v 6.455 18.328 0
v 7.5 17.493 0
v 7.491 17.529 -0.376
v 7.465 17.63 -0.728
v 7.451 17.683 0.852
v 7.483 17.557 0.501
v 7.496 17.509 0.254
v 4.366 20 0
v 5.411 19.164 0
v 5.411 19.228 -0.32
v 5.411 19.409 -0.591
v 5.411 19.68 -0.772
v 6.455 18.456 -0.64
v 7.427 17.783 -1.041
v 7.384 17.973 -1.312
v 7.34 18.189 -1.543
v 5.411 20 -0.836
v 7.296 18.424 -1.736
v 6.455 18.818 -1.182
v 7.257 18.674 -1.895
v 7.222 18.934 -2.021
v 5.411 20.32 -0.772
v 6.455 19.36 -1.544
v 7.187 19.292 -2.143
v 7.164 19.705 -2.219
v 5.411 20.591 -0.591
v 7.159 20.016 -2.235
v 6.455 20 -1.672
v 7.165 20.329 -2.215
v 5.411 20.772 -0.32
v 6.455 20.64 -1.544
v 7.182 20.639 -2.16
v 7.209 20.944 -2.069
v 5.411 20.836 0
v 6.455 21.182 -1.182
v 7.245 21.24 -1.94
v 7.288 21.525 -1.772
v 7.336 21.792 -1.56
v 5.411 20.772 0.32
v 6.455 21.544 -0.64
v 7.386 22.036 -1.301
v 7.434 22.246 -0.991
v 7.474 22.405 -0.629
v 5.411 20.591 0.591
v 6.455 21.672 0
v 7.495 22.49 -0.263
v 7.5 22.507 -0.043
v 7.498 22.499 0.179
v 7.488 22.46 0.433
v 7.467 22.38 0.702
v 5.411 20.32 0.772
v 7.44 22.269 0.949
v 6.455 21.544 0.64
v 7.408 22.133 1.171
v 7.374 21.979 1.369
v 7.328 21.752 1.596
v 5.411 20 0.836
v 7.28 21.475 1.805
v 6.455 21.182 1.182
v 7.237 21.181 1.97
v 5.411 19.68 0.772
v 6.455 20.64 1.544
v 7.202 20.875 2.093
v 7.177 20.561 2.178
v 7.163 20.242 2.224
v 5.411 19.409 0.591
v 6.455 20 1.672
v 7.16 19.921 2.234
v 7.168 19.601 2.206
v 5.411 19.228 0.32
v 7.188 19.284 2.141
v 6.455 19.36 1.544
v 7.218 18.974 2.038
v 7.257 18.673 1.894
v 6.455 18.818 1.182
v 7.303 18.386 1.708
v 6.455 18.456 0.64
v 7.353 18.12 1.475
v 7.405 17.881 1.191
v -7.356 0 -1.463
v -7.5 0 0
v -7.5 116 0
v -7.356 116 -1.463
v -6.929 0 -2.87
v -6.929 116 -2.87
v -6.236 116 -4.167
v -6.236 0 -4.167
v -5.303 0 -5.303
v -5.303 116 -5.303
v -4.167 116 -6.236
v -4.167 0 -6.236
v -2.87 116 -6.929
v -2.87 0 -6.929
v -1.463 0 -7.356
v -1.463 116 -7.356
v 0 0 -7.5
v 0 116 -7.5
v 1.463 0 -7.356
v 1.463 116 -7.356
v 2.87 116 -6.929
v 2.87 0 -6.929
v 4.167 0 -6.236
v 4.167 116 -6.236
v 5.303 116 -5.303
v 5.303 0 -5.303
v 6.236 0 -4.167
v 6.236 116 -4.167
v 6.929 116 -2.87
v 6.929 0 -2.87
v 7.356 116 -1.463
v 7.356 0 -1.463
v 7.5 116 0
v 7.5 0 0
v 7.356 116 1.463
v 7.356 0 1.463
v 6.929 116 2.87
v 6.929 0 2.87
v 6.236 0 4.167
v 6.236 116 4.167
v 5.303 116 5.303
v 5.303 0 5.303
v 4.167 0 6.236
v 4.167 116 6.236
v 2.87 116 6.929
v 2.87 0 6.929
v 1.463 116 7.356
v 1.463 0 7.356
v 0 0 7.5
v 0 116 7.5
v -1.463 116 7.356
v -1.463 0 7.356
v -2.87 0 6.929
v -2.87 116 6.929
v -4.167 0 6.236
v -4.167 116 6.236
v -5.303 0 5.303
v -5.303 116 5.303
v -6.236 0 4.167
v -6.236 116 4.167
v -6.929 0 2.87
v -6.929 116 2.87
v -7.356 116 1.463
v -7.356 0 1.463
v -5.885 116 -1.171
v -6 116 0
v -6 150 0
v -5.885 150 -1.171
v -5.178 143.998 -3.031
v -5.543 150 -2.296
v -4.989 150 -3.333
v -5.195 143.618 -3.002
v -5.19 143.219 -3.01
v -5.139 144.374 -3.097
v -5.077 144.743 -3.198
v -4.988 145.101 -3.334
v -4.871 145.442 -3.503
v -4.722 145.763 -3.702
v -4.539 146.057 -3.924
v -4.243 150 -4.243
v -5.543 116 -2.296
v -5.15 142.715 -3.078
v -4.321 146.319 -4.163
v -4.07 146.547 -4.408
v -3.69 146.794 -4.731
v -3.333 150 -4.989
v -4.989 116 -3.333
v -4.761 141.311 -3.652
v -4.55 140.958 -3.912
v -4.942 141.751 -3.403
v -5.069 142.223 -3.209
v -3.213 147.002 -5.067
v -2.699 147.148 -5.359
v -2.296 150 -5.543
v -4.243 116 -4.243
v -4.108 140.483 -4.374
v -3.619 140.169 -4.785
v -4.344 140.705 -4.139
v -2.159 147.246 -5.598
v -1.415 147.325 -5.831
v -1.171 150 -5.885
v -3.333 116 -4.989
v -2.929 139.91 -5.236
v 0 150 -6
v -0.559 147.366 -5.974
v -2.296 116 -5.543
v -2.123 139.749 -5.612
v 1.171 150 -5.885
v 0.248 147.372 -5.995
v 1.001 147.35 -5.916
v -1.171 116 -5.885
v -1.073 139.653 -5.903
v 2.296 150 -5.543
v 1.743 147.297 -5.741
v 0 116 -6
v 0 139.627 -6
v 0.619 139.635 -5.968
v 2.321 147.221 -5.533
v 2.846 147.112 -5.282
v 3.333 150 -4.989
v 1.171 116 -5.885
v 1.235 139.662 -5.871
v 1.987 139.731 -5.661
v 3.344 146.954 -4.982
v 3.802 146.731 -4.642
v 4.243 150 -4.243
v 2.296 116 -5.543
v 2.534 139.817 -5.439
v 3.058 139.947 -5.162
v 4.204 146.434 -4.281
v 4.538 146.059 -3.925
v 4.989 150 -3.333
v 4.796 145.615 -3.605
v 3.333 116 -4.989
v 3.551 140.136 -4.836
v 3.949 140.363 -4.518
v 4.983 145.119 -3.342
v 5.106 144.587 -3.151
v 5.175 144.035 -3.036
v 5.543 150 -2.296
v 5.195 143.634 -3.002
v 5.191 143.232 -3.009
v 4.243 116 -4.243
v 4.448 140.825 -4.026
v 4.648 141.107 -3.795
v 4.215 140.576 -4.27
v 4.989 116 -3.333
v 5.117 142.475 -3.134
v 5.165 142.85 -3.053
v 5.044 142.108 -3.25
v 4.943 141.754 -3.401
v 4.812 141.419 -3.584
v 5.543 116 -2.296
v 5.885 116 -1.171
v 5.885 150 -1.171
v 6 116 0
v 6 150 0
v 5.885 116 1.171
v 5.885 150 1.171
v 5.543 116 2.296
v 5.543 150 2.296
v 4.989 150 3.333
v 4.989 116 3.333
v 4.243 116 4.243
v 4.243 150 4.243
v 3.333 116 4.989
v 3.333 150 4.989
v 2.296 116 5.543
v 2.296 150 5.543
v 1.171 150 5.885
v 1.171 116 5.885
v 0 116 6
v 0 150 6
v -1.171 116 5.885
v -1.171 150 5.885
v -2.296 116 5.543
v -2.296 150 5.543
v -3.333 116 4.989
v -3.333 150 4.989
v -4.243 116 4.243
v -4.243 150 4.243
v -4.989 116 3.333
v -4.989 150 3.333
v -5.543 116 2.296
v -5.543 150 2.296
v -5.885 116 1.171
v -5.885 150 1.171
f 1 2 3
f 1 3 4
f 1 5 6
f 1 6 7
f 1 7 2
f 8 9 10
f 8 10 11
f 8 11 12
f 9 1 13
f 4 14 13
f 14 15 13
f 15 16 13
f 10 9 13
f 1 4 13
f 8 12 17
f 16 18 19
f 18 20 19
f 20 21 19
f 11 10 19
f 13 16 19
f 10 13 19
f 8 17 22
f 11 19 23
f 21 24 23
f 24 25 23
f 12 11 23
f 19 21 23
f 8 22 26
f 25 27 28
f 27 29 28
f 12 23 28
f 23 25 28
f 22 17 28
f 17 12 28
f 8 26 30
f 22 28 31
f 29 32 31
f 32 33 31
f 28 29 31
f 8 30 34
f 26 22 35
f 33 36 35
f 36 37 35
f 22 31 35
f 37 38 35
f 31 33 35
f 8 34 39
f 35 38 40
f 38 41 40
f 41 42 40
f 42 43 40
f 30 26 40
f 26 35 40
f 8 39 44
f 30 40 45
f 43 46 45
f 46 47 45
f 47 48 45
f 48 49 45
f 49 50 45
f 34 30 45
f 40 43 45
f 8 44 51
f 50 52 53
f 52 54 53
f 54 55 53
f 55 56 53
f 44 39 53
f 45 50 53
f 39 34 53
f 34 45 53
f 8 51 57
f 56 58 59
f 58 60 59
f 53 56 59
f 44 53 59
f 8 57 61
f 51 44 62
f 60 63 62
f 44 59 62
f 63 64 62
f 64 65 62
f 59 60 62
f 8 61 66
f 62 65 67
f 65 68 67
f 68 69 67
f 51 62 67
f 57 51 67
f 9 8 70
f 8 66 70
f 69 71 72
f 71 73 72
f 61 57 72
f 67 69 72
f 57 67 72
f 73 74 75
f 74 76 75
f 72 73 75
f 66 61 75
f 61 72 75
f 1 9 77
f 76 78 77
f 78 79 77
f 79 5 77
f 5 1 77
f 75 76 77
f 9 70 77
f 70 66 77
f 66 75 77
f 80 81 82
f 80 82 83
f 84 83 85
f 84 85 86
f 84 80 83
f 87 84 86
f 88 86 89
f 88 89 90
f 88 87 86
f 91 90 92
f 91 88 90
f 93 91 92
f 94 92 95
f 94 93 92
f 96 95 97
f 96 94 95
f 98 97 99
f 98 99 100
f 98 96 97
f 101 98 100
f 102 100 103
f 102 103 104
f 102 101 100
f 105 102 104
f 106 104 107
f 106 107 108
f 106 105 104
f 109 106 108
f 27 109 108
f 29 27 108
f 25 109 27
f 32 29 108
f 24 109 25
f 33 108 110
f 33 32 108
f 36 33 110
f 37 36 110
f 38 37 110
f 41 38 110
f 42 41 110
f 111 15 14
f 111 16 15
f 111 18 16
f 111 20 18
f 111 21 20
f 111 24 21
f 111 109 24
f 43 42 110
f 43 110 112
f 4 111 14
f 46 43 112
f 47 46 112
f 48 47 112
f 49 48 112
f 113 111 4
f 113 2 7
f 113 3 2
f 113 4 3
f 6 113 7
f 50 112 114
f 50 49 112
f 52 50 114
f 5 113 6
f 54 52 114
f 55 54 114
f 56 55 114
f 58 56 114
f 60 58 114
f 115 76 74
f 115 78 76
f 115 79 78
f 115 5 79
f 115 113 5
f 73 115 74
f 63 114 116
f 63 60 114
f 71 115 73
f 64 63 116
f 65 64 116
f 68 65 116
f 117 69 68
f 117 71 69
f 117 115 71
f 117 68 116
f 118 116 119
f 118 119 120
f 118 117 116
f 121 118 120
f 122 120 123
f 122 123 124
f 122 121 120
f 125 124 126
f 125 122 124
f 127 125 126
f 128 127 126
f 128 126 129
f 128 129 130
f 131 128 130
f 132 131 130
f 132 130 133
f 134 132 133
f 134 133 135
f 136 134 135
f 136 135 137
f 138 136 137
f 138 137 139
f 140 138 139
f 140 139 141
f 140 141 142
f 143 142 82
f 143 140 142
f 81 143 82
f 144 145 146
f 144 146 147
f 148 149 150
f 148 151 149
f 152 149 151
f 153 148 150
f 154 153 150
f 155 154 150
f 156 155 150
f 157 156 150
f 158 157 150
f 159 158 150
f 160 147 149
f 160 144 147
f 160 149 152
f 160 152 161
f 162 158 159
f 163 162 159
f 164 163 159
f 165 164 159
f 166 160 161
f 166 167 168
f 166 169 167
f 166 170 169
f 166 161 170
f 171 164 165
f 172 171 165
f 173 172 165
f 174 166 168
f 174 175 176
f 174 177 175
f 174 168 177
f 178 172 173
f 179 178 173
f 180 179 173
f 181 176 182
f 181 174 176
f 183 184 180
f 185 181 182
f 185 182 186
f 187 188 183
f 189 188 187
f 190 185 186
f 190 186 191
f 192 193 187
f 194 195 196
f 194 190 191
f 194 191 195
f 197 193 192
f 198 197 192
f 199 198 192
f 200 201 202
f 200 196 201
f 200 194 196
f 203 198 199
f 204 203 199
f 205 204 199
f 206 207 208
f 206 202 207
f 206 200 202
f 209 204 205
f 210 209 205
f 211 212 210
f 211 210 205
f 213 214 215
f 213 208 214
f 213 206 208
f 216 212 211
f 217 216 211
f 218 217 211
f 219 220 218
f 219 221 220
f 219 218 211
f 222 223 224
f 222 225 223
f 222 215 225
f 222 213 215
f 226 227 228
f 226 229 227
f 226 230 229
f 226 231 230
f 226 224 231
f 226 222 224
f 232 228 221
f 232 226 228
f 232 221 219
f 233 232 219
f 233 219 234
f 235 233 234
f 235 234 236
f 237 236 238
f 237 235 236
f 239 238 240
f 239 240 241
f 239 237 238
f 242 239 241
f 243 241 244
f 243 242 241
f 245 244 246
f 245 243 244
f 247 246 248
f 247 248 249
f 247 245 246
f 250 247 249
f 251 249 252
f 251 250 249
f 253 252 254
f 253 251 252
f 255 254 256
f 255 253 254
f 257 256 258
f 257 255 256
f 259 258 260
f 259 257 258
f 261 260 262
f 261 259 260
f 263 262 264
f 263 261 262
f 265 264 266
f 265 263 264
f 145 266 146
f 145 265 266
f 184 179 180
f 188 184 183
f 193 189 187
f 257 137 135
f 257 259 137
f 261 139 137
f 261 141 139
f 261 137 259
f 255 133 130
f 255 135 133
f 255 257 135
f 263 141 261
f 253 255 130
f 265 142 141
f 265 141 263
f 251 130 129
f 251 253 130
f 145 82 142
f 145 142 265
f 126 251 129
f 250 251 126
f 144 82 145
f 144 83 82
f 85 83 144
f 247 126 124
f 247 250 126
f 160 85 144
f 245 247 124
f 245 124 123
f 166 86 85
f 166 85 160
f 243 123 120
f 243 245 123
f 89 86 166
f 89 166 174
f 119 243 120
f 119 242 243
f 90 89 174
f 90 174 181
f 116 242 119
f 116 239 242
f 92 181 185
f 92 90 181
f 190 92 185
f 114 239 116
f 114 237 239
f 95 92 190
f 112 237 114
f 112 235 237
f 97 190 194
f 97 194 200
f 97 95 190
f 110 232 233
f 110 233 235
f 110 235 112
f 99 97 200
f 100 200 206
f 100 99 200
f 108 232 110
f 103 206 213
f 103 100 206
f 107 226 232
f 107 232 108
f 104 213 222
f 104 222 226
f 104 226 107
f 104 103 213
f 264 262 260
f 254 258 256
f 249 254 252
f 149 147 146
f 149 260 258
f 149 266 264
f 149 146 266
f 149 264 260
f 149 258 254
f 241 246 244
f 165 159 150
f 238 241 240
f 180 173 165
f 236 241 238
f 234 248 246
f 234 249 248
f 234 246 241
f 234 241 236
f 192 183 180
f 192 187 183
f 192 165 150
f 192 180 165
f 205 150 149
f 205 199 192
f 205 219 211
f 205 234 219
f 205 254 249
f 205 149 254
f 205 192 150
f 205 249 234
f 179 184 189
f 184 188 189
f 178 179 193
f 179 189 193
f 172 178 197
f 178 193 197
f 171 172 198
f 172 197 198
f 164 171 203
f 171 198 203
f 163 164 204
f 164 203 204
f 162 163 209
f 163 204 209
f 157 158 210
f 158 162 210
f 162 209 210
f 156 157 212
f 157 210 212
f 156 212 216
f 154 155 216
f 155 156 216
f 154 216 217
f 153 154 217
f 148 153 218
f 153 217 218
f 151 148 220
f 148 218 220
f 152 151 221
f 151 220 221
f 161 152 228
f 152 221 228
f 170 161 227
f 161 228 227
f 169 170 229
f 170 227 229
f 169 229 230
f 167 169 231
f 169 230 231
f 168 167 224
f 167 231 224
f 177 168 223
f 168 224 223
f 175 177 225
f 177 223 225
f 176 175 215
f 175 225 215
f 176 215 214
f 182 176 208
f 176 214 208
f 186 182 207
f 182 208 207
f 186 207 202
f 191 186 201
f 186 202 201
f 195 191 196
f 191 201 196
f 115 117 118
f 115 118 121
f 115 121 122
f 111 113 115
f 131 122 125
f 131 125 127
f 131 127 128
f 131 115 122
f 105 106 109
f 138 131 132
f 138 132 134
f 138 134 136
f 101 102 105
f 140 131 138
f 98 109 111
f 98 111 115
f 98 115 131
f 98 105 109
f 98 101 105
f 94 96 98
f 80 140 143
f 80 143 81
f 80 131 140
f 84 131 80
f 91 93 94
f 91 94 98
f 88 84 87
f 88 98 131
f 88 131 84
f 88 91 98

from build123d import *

# Parameters (mm, degrees)
F4_R     = 4
F5_DEPTH = 12.5


with BuildPart() as f1:
    # F0 (on Top) → F1 (revolve)
    with BuildSketch(Plane.XY):
        Polygon((-7.5, 0), (0, 0), (0, 150), (-6, 150), (-6, 116), (-7.5, 116), align=None)
    revolve(axis=Axis((0, 75, 0), (0, -1, 0)))

    # F2 (on Top) → F3 (revolve, cut)
    with BuildSketch(Plane.XY):
        Polygon((4.365895, 20), (9.365895, 16), (9.365895, 20), align=None)
    revolve(axis=Axis((12.081508, 20, 0), (1, 0, 0)), mode=Mode.SUBTRACT)

    # F4 (on Right) → F5 (cut, symmetric)
    with BuildSketch(Plane.YZ):
        with Locations((143.5, -7)):
            Circle(F4_R)
    extrude(amount=F5_DEPTH, both=True, mode=Mode.SUBTRACT)


solid = f1.part
